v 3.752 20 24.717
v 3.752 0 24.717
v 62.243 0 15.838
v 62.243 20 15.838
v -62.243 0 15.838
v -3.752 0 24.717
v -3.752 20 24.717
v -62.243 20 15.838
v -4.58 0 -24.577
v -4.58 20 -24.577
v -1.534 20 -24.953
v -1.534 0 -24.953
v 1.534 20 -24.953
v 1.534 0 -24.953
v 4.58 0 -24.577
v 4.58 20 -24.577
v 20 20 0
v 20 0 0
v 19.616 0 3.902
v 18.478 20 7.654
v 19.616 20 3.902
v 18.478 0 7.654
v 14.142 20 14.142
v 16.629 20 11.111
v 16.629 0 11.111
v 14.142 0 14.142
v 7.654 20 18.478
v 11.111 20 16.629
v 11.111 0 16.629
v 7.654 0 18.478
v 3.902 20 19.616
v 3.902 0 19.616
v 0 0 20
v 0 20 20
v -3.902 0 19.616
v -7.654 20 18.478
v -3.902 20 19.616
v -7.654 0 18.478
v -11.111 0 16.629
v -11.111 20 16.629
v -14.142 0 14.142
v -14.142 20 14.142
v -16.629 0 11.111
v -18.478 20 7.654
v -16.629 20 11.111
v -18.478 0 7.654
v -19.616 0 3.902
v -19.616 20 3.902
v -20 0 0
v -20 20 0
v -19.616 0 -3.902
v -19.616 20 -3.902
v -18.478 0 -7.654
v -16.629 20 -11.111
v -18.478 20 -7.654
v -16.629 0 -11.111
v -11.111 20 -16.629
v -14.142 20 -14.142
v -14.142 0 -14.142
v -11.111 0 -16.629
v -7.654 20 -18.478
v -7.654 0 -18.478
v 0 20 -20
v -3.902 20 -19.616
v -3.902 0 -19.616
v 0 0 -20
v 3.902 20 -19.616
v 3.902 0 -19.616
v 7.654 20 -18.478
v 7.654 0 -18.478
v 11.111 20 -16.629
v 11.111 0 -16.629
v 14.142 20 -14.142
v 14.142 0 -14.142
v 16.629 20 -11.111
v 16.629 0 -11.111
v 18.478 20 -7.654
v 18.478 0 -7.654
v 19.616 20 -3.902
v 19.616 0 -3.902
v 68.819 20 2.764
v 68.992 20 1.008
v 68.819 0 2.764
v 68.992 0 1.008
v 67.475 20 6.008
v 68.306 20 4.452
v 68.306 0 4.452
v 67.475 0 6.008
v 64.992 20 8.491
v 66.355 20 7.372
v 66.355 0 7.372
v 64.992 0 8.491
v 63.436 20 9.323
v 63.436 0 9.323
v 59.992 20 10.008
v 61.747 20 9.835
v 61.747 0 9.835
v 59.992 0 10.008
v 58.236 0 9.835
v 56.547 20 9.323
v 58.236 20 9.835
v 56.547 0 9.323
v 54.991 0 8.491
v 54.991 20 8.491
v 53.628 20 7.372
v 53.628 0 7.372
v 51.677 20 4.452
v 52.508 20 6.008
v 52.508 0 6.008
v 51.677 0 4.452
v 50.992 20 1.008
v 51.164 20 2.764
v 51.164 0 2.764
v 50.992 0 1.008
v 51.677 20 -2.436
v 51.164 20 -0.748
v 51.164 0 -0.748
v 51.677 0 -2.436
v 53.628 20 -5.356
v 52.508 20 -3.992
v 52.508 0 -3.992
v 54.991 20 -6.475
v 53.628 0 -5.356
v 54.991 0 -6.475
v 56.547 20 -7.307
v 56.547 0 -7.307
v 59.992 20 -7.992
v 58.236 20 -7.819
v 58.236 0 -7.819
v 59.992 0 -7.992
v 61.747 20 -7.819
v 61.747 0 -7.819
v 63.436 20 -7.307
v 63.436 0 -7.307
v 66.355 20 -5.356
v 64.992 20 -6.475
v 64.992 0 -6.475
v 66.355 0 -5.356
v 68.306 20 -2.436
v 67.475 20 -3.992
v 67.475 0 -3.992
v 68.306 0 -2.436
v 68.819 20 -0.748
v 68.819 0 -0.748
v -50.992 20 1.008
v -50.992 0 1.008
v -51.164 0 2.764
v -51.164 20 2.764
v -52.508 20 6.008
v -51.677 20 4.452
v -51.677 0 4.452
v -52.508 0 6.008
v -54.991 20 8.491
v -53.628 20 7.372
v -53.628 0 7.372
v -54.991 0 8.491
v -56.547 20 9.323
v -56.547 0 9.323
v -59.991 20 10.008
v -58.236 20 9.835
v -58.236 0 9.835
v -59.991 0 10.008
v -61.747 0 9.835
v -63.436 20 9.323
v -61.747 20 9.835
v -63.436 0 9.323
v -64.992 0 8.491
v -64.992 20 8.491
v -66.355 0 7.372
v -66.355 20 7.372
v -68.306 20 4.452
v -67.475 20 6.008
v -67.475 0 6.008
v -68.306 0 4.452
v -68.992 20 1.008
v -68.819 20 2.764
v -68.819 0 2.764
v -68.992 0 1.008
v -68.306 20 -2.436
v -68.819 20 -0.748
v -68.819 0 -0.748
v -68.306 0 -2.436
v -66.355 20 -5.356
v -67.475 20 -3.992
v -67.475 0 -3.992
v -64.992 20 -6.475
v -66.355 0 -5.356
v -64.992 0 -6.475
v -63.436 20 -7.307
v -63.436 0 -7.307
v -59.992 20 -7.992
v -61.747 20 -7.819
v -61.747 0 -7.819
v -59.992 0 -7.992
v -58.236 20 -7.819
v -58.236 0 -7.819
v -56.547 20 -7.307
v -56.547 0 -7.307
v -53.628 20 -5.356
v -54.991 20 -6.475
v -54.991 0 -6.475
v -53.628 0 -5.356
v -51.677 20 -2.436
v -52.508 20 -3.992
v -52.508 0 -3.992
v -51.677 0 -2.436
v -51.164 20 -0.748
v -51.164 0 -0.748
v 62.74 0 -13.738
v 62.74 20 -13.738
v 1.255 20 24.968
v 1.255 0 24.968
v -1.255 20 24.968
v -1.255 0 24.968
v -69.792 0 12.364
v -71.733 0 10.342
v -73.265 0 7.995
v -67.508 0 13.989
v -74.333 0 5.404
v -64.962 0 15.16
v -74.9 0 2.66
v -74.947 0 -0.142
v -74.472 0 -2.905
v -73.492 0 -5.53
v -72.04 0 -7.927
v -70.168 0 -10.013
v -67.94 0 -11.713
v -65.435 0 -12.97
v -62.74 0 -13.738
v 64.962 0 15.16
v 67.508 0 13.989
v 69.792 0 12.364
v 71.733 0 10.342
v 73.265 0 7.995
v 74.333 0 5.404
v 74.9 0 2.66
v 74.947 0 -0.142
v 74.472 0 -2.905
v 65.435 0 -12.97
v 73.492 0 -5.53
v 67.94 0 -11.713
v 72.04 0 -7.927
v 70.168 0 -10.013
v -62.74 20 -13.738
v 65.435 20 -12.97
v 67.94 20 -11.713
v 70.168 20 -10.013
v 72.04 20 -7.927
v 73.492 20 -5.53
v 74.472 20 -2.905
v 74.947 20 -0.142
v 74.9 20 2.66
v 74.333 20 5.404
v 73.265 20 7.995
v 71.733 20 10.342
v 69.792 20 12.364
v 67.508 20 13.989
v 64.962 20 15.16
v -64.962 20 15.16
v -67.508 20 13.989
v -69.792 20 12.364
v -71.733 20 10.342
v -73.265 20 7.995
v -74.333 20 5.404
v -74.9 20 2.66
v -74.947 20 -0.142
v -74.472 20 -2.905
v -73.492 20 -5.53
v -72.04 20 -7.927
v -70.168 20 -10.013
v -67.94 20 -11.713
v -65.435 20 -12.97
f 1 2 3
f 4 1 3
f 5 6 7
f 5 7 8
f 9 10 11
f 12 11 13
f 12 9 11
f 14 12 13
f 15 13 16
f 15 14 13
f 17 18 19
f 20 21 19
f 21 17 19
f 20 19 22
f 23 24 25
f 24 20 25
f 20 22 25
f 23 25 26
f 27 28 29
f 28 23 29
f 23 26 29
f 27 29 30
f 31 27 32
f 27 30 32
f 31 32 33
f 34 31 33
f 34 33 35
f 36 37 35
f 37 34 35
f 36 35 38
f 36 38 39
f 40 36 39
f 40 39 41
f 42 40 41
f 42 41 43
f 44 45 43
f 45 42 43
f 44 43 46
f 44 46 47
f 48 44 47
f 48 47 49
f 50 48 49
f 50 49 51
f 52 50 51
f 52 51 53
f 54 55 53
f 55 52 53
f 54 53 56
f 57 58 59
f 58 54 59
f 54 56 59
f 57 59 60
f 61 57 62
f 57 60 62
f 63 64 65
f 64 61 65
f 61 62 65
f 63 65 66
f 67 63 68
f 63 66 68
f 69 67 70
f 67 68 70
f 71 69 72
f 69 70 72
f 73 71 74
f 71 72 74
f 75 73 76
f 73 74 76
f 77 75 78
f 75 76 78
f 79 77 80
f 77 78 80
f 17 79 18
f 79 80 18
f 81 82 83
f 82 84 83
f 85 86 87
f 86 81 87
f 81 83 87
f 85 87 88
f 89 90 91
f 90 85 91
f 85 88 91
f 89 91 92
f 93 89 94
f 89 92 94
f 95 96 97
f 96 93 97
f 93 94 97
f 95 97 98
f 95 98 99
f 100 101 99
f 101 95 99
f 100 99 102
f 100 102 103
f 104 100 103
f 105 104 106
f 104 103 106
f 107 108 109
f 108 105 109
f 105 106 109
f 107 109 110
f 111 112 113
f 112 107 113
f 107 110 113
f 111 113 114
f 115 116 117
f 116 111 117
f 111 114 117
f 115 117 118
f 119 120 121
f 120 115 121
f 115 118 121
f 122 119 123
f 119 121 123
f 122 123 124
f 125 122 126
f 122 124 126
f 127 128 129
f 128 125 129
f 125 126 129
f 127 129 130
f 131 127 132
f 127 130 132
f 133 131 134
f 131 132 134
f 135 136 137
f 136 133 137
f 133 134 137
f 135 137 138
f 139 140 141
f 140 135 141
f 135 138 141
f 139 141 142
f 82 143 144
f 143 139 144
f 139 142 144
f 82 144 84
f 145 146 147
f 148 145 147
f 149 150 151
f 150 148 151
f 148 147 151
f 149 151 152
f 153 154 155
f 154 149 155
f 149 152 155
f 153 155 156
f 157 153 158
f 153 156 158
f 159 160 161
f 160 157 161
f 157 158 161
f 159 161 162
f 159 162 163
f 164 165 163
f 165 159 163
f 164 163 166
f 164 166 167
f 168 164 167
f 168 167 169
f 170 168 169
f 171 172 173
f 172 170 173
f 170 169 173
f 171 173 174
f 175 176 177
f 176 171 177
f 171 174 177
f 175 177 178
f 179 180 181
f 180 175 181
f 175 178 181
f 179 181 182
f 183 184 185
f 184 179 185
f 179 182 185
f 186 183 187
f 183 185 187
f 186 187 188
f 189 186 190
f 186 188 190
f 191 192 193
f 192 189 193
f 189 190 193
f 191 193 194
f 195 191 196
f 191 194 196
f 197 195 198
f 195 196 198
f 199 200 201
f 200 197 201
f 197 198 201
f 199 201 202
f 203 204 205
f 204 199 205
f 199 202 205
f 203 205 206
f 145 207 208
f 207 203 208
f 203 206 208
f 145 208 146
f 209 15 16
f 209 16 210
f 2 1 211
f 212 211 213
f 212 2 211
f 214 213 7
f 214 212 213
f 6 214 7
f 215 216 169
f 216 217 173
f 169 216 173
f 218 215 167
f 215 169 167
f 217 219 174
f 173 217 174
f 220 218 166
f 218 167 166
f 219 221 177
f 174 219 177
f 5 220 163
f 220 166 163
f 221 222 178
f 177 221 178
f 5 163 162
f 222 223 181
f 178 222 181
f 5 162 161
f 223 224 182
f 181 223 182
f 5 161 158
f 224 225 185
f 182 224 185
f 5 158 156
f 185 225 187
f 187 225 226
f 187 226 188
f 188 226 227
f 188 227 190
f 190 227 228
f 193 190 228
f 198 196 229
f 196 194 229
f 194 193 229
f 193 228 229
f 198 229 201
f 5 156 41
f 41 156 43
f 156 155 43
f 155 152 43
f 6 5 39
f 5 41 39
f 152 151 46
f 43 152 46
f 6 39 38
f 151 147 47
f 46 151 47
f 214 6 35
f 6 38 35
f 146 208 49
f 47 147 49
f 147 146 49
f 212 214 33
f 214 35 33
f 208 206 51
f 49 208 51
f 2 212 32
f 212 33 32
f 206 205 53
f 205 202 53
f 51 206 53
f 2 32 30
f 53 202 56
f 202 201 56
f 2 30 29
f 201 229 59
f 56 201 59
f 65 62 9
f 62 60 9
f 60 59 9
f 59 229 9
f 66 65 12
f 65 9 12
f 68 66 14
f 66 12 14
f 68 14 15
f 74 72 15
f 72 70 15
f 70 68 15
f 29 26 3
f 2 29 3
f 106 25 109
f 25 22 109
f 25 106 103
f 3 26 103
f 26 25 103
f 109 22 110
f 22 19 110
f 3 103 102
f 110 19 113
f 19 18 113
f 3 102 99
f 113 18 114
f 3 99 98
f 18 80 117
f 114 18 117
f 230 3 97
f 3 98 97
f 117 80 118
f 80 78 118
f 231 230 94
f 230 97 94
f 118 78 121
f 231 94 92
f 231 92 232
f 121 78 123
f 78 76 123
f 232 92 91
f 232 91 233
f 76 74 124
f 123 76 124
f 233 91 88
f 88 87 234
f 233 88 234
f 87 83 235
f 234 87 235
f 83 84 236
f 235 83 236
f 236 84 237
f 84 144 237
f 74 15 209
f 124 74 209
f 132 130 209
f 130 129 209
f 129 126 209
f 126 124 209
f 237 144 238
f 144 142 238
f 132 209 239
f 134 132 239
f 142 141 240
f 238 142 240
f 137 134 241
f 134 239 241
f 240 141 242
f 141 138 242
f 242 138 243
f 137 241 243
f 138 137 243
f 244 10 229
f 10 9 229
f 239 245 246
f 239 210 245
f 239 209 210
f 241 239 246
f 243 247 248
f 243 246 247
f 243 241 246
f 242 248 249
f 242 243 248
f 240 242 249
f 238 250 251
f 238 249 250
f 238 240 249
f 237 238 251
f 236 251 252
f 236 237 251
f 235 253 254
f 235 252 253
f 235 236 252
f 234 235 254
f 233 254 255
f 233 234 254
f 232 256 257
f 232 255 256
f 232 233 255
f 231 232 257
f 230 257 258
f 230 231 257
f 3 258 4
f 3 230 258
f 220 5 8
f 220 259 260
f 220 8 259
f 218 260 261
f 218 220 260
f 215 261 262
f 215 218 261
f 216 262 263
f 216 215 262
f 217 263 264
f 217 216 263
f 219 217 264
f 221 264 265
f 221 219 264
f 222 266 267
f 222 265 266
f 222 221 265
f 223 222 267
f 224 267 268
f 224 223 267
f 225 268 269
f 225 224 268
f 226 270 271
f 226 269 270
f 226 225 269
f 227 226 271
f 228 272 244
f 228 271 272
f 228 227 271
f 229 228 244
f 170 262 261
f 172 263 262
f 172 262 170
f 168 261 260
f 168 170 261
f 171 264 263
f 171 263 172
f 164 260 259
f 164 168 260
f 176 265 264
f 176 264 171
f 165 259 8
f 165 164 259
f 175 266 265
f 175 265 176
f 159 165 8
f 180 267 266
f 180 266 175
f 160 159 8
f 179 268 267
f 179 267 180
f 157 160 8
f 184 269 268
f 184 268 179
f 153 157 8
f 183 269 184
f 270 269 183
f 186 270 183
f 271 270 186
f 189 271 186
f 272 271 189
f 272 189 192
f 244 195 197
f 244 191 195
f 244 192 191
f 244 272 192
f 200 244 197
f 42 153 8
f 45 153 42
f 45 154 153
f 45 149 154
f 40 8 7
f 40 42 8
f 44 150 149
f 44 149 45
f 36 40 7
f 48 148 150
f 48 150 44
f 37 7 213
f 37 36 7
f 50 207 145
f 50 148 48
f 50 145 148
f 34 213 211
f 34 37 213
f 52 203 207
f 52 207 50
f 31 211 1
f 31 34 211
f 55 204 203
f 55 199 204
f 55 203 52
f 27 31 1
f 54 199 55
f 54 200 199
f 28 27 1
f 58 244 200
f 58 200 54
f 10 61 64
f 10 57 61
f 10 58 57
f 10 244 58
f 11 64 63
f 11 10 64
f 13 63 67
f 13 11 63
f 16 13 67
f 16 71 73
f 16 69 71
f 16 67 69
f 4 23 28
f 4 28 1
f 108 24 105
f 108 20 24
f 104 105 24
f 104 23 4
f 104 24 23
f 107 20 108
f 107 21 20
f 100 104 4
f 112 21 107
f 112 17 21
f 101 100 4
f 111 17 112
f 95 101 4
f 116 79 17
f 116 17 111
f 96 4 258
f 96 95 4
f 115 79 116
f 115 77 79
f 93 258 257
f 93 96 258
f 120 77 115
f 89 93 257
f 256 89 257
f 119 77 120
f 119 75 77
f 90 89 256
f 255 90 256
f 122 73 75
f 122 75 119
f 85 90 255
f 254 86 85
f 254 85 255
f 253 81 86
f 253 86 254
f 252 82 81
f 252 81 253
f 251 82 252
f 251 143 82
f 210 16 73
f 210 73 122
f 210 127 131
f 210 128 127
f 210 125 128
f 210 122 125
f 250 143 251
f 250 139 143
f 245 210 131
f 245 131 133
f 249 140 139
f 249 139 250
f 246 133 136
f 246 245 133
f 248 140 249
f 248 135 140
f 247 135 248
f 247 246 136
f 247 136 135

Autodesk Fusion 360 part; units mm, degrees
sketch "Sketch2" plane through (0, 0, 0) normal (0, 1, 0) x (1, 0, 0)
  line L0 (-75, -1.0078) -> (75, -1.0078) construction
  line L1 (3.752, -24.7168) -> (62.2428, -15.8379)
  line L2 (-3.752, -24.7168) -> (-62.2428, -15.8379)
  line L3 (-4.5801, 24.5769) -> (-62.7396, 13.7383)
  line L4 (4.5801, 24.5769) -> (62.7396, 13.7383)
  arc A0 (62.2428, -15.8379) -> (62.7396, 13.7383) centre (59.9915, -1.0078) ccw
  arc A1 (-62.7396, 13.7383) -> (-62.2428, -15.8379) centre (-59.9915, -1.0078) ccw
  arc A2 (-3.752, -24.7168) -> (3.752, -24.7168) centre (0, 0) ccw
  arc A3 (4.5801, 24.5769) -> (-4.5801, 24.5769) centre (0, 0) ccw
  circle A4 centre (0, 0) radius 20
  circle A5 centre (59.9915, -1.0078) radius 9
  circle A6 centre (-59.9915, -1.0078) radius 9
  dimension "d8" = 50
  dimension "d9" = 30
  dimension "d10" = 30
  dimension "d11" = 60
  dimension "d12" = 60
  dimension "d13" = 40
  dimension "d14" = 18
  dimension "d15" = 18
extrude "Extrude1" add sketch "Sketch2" along normal blind 20
